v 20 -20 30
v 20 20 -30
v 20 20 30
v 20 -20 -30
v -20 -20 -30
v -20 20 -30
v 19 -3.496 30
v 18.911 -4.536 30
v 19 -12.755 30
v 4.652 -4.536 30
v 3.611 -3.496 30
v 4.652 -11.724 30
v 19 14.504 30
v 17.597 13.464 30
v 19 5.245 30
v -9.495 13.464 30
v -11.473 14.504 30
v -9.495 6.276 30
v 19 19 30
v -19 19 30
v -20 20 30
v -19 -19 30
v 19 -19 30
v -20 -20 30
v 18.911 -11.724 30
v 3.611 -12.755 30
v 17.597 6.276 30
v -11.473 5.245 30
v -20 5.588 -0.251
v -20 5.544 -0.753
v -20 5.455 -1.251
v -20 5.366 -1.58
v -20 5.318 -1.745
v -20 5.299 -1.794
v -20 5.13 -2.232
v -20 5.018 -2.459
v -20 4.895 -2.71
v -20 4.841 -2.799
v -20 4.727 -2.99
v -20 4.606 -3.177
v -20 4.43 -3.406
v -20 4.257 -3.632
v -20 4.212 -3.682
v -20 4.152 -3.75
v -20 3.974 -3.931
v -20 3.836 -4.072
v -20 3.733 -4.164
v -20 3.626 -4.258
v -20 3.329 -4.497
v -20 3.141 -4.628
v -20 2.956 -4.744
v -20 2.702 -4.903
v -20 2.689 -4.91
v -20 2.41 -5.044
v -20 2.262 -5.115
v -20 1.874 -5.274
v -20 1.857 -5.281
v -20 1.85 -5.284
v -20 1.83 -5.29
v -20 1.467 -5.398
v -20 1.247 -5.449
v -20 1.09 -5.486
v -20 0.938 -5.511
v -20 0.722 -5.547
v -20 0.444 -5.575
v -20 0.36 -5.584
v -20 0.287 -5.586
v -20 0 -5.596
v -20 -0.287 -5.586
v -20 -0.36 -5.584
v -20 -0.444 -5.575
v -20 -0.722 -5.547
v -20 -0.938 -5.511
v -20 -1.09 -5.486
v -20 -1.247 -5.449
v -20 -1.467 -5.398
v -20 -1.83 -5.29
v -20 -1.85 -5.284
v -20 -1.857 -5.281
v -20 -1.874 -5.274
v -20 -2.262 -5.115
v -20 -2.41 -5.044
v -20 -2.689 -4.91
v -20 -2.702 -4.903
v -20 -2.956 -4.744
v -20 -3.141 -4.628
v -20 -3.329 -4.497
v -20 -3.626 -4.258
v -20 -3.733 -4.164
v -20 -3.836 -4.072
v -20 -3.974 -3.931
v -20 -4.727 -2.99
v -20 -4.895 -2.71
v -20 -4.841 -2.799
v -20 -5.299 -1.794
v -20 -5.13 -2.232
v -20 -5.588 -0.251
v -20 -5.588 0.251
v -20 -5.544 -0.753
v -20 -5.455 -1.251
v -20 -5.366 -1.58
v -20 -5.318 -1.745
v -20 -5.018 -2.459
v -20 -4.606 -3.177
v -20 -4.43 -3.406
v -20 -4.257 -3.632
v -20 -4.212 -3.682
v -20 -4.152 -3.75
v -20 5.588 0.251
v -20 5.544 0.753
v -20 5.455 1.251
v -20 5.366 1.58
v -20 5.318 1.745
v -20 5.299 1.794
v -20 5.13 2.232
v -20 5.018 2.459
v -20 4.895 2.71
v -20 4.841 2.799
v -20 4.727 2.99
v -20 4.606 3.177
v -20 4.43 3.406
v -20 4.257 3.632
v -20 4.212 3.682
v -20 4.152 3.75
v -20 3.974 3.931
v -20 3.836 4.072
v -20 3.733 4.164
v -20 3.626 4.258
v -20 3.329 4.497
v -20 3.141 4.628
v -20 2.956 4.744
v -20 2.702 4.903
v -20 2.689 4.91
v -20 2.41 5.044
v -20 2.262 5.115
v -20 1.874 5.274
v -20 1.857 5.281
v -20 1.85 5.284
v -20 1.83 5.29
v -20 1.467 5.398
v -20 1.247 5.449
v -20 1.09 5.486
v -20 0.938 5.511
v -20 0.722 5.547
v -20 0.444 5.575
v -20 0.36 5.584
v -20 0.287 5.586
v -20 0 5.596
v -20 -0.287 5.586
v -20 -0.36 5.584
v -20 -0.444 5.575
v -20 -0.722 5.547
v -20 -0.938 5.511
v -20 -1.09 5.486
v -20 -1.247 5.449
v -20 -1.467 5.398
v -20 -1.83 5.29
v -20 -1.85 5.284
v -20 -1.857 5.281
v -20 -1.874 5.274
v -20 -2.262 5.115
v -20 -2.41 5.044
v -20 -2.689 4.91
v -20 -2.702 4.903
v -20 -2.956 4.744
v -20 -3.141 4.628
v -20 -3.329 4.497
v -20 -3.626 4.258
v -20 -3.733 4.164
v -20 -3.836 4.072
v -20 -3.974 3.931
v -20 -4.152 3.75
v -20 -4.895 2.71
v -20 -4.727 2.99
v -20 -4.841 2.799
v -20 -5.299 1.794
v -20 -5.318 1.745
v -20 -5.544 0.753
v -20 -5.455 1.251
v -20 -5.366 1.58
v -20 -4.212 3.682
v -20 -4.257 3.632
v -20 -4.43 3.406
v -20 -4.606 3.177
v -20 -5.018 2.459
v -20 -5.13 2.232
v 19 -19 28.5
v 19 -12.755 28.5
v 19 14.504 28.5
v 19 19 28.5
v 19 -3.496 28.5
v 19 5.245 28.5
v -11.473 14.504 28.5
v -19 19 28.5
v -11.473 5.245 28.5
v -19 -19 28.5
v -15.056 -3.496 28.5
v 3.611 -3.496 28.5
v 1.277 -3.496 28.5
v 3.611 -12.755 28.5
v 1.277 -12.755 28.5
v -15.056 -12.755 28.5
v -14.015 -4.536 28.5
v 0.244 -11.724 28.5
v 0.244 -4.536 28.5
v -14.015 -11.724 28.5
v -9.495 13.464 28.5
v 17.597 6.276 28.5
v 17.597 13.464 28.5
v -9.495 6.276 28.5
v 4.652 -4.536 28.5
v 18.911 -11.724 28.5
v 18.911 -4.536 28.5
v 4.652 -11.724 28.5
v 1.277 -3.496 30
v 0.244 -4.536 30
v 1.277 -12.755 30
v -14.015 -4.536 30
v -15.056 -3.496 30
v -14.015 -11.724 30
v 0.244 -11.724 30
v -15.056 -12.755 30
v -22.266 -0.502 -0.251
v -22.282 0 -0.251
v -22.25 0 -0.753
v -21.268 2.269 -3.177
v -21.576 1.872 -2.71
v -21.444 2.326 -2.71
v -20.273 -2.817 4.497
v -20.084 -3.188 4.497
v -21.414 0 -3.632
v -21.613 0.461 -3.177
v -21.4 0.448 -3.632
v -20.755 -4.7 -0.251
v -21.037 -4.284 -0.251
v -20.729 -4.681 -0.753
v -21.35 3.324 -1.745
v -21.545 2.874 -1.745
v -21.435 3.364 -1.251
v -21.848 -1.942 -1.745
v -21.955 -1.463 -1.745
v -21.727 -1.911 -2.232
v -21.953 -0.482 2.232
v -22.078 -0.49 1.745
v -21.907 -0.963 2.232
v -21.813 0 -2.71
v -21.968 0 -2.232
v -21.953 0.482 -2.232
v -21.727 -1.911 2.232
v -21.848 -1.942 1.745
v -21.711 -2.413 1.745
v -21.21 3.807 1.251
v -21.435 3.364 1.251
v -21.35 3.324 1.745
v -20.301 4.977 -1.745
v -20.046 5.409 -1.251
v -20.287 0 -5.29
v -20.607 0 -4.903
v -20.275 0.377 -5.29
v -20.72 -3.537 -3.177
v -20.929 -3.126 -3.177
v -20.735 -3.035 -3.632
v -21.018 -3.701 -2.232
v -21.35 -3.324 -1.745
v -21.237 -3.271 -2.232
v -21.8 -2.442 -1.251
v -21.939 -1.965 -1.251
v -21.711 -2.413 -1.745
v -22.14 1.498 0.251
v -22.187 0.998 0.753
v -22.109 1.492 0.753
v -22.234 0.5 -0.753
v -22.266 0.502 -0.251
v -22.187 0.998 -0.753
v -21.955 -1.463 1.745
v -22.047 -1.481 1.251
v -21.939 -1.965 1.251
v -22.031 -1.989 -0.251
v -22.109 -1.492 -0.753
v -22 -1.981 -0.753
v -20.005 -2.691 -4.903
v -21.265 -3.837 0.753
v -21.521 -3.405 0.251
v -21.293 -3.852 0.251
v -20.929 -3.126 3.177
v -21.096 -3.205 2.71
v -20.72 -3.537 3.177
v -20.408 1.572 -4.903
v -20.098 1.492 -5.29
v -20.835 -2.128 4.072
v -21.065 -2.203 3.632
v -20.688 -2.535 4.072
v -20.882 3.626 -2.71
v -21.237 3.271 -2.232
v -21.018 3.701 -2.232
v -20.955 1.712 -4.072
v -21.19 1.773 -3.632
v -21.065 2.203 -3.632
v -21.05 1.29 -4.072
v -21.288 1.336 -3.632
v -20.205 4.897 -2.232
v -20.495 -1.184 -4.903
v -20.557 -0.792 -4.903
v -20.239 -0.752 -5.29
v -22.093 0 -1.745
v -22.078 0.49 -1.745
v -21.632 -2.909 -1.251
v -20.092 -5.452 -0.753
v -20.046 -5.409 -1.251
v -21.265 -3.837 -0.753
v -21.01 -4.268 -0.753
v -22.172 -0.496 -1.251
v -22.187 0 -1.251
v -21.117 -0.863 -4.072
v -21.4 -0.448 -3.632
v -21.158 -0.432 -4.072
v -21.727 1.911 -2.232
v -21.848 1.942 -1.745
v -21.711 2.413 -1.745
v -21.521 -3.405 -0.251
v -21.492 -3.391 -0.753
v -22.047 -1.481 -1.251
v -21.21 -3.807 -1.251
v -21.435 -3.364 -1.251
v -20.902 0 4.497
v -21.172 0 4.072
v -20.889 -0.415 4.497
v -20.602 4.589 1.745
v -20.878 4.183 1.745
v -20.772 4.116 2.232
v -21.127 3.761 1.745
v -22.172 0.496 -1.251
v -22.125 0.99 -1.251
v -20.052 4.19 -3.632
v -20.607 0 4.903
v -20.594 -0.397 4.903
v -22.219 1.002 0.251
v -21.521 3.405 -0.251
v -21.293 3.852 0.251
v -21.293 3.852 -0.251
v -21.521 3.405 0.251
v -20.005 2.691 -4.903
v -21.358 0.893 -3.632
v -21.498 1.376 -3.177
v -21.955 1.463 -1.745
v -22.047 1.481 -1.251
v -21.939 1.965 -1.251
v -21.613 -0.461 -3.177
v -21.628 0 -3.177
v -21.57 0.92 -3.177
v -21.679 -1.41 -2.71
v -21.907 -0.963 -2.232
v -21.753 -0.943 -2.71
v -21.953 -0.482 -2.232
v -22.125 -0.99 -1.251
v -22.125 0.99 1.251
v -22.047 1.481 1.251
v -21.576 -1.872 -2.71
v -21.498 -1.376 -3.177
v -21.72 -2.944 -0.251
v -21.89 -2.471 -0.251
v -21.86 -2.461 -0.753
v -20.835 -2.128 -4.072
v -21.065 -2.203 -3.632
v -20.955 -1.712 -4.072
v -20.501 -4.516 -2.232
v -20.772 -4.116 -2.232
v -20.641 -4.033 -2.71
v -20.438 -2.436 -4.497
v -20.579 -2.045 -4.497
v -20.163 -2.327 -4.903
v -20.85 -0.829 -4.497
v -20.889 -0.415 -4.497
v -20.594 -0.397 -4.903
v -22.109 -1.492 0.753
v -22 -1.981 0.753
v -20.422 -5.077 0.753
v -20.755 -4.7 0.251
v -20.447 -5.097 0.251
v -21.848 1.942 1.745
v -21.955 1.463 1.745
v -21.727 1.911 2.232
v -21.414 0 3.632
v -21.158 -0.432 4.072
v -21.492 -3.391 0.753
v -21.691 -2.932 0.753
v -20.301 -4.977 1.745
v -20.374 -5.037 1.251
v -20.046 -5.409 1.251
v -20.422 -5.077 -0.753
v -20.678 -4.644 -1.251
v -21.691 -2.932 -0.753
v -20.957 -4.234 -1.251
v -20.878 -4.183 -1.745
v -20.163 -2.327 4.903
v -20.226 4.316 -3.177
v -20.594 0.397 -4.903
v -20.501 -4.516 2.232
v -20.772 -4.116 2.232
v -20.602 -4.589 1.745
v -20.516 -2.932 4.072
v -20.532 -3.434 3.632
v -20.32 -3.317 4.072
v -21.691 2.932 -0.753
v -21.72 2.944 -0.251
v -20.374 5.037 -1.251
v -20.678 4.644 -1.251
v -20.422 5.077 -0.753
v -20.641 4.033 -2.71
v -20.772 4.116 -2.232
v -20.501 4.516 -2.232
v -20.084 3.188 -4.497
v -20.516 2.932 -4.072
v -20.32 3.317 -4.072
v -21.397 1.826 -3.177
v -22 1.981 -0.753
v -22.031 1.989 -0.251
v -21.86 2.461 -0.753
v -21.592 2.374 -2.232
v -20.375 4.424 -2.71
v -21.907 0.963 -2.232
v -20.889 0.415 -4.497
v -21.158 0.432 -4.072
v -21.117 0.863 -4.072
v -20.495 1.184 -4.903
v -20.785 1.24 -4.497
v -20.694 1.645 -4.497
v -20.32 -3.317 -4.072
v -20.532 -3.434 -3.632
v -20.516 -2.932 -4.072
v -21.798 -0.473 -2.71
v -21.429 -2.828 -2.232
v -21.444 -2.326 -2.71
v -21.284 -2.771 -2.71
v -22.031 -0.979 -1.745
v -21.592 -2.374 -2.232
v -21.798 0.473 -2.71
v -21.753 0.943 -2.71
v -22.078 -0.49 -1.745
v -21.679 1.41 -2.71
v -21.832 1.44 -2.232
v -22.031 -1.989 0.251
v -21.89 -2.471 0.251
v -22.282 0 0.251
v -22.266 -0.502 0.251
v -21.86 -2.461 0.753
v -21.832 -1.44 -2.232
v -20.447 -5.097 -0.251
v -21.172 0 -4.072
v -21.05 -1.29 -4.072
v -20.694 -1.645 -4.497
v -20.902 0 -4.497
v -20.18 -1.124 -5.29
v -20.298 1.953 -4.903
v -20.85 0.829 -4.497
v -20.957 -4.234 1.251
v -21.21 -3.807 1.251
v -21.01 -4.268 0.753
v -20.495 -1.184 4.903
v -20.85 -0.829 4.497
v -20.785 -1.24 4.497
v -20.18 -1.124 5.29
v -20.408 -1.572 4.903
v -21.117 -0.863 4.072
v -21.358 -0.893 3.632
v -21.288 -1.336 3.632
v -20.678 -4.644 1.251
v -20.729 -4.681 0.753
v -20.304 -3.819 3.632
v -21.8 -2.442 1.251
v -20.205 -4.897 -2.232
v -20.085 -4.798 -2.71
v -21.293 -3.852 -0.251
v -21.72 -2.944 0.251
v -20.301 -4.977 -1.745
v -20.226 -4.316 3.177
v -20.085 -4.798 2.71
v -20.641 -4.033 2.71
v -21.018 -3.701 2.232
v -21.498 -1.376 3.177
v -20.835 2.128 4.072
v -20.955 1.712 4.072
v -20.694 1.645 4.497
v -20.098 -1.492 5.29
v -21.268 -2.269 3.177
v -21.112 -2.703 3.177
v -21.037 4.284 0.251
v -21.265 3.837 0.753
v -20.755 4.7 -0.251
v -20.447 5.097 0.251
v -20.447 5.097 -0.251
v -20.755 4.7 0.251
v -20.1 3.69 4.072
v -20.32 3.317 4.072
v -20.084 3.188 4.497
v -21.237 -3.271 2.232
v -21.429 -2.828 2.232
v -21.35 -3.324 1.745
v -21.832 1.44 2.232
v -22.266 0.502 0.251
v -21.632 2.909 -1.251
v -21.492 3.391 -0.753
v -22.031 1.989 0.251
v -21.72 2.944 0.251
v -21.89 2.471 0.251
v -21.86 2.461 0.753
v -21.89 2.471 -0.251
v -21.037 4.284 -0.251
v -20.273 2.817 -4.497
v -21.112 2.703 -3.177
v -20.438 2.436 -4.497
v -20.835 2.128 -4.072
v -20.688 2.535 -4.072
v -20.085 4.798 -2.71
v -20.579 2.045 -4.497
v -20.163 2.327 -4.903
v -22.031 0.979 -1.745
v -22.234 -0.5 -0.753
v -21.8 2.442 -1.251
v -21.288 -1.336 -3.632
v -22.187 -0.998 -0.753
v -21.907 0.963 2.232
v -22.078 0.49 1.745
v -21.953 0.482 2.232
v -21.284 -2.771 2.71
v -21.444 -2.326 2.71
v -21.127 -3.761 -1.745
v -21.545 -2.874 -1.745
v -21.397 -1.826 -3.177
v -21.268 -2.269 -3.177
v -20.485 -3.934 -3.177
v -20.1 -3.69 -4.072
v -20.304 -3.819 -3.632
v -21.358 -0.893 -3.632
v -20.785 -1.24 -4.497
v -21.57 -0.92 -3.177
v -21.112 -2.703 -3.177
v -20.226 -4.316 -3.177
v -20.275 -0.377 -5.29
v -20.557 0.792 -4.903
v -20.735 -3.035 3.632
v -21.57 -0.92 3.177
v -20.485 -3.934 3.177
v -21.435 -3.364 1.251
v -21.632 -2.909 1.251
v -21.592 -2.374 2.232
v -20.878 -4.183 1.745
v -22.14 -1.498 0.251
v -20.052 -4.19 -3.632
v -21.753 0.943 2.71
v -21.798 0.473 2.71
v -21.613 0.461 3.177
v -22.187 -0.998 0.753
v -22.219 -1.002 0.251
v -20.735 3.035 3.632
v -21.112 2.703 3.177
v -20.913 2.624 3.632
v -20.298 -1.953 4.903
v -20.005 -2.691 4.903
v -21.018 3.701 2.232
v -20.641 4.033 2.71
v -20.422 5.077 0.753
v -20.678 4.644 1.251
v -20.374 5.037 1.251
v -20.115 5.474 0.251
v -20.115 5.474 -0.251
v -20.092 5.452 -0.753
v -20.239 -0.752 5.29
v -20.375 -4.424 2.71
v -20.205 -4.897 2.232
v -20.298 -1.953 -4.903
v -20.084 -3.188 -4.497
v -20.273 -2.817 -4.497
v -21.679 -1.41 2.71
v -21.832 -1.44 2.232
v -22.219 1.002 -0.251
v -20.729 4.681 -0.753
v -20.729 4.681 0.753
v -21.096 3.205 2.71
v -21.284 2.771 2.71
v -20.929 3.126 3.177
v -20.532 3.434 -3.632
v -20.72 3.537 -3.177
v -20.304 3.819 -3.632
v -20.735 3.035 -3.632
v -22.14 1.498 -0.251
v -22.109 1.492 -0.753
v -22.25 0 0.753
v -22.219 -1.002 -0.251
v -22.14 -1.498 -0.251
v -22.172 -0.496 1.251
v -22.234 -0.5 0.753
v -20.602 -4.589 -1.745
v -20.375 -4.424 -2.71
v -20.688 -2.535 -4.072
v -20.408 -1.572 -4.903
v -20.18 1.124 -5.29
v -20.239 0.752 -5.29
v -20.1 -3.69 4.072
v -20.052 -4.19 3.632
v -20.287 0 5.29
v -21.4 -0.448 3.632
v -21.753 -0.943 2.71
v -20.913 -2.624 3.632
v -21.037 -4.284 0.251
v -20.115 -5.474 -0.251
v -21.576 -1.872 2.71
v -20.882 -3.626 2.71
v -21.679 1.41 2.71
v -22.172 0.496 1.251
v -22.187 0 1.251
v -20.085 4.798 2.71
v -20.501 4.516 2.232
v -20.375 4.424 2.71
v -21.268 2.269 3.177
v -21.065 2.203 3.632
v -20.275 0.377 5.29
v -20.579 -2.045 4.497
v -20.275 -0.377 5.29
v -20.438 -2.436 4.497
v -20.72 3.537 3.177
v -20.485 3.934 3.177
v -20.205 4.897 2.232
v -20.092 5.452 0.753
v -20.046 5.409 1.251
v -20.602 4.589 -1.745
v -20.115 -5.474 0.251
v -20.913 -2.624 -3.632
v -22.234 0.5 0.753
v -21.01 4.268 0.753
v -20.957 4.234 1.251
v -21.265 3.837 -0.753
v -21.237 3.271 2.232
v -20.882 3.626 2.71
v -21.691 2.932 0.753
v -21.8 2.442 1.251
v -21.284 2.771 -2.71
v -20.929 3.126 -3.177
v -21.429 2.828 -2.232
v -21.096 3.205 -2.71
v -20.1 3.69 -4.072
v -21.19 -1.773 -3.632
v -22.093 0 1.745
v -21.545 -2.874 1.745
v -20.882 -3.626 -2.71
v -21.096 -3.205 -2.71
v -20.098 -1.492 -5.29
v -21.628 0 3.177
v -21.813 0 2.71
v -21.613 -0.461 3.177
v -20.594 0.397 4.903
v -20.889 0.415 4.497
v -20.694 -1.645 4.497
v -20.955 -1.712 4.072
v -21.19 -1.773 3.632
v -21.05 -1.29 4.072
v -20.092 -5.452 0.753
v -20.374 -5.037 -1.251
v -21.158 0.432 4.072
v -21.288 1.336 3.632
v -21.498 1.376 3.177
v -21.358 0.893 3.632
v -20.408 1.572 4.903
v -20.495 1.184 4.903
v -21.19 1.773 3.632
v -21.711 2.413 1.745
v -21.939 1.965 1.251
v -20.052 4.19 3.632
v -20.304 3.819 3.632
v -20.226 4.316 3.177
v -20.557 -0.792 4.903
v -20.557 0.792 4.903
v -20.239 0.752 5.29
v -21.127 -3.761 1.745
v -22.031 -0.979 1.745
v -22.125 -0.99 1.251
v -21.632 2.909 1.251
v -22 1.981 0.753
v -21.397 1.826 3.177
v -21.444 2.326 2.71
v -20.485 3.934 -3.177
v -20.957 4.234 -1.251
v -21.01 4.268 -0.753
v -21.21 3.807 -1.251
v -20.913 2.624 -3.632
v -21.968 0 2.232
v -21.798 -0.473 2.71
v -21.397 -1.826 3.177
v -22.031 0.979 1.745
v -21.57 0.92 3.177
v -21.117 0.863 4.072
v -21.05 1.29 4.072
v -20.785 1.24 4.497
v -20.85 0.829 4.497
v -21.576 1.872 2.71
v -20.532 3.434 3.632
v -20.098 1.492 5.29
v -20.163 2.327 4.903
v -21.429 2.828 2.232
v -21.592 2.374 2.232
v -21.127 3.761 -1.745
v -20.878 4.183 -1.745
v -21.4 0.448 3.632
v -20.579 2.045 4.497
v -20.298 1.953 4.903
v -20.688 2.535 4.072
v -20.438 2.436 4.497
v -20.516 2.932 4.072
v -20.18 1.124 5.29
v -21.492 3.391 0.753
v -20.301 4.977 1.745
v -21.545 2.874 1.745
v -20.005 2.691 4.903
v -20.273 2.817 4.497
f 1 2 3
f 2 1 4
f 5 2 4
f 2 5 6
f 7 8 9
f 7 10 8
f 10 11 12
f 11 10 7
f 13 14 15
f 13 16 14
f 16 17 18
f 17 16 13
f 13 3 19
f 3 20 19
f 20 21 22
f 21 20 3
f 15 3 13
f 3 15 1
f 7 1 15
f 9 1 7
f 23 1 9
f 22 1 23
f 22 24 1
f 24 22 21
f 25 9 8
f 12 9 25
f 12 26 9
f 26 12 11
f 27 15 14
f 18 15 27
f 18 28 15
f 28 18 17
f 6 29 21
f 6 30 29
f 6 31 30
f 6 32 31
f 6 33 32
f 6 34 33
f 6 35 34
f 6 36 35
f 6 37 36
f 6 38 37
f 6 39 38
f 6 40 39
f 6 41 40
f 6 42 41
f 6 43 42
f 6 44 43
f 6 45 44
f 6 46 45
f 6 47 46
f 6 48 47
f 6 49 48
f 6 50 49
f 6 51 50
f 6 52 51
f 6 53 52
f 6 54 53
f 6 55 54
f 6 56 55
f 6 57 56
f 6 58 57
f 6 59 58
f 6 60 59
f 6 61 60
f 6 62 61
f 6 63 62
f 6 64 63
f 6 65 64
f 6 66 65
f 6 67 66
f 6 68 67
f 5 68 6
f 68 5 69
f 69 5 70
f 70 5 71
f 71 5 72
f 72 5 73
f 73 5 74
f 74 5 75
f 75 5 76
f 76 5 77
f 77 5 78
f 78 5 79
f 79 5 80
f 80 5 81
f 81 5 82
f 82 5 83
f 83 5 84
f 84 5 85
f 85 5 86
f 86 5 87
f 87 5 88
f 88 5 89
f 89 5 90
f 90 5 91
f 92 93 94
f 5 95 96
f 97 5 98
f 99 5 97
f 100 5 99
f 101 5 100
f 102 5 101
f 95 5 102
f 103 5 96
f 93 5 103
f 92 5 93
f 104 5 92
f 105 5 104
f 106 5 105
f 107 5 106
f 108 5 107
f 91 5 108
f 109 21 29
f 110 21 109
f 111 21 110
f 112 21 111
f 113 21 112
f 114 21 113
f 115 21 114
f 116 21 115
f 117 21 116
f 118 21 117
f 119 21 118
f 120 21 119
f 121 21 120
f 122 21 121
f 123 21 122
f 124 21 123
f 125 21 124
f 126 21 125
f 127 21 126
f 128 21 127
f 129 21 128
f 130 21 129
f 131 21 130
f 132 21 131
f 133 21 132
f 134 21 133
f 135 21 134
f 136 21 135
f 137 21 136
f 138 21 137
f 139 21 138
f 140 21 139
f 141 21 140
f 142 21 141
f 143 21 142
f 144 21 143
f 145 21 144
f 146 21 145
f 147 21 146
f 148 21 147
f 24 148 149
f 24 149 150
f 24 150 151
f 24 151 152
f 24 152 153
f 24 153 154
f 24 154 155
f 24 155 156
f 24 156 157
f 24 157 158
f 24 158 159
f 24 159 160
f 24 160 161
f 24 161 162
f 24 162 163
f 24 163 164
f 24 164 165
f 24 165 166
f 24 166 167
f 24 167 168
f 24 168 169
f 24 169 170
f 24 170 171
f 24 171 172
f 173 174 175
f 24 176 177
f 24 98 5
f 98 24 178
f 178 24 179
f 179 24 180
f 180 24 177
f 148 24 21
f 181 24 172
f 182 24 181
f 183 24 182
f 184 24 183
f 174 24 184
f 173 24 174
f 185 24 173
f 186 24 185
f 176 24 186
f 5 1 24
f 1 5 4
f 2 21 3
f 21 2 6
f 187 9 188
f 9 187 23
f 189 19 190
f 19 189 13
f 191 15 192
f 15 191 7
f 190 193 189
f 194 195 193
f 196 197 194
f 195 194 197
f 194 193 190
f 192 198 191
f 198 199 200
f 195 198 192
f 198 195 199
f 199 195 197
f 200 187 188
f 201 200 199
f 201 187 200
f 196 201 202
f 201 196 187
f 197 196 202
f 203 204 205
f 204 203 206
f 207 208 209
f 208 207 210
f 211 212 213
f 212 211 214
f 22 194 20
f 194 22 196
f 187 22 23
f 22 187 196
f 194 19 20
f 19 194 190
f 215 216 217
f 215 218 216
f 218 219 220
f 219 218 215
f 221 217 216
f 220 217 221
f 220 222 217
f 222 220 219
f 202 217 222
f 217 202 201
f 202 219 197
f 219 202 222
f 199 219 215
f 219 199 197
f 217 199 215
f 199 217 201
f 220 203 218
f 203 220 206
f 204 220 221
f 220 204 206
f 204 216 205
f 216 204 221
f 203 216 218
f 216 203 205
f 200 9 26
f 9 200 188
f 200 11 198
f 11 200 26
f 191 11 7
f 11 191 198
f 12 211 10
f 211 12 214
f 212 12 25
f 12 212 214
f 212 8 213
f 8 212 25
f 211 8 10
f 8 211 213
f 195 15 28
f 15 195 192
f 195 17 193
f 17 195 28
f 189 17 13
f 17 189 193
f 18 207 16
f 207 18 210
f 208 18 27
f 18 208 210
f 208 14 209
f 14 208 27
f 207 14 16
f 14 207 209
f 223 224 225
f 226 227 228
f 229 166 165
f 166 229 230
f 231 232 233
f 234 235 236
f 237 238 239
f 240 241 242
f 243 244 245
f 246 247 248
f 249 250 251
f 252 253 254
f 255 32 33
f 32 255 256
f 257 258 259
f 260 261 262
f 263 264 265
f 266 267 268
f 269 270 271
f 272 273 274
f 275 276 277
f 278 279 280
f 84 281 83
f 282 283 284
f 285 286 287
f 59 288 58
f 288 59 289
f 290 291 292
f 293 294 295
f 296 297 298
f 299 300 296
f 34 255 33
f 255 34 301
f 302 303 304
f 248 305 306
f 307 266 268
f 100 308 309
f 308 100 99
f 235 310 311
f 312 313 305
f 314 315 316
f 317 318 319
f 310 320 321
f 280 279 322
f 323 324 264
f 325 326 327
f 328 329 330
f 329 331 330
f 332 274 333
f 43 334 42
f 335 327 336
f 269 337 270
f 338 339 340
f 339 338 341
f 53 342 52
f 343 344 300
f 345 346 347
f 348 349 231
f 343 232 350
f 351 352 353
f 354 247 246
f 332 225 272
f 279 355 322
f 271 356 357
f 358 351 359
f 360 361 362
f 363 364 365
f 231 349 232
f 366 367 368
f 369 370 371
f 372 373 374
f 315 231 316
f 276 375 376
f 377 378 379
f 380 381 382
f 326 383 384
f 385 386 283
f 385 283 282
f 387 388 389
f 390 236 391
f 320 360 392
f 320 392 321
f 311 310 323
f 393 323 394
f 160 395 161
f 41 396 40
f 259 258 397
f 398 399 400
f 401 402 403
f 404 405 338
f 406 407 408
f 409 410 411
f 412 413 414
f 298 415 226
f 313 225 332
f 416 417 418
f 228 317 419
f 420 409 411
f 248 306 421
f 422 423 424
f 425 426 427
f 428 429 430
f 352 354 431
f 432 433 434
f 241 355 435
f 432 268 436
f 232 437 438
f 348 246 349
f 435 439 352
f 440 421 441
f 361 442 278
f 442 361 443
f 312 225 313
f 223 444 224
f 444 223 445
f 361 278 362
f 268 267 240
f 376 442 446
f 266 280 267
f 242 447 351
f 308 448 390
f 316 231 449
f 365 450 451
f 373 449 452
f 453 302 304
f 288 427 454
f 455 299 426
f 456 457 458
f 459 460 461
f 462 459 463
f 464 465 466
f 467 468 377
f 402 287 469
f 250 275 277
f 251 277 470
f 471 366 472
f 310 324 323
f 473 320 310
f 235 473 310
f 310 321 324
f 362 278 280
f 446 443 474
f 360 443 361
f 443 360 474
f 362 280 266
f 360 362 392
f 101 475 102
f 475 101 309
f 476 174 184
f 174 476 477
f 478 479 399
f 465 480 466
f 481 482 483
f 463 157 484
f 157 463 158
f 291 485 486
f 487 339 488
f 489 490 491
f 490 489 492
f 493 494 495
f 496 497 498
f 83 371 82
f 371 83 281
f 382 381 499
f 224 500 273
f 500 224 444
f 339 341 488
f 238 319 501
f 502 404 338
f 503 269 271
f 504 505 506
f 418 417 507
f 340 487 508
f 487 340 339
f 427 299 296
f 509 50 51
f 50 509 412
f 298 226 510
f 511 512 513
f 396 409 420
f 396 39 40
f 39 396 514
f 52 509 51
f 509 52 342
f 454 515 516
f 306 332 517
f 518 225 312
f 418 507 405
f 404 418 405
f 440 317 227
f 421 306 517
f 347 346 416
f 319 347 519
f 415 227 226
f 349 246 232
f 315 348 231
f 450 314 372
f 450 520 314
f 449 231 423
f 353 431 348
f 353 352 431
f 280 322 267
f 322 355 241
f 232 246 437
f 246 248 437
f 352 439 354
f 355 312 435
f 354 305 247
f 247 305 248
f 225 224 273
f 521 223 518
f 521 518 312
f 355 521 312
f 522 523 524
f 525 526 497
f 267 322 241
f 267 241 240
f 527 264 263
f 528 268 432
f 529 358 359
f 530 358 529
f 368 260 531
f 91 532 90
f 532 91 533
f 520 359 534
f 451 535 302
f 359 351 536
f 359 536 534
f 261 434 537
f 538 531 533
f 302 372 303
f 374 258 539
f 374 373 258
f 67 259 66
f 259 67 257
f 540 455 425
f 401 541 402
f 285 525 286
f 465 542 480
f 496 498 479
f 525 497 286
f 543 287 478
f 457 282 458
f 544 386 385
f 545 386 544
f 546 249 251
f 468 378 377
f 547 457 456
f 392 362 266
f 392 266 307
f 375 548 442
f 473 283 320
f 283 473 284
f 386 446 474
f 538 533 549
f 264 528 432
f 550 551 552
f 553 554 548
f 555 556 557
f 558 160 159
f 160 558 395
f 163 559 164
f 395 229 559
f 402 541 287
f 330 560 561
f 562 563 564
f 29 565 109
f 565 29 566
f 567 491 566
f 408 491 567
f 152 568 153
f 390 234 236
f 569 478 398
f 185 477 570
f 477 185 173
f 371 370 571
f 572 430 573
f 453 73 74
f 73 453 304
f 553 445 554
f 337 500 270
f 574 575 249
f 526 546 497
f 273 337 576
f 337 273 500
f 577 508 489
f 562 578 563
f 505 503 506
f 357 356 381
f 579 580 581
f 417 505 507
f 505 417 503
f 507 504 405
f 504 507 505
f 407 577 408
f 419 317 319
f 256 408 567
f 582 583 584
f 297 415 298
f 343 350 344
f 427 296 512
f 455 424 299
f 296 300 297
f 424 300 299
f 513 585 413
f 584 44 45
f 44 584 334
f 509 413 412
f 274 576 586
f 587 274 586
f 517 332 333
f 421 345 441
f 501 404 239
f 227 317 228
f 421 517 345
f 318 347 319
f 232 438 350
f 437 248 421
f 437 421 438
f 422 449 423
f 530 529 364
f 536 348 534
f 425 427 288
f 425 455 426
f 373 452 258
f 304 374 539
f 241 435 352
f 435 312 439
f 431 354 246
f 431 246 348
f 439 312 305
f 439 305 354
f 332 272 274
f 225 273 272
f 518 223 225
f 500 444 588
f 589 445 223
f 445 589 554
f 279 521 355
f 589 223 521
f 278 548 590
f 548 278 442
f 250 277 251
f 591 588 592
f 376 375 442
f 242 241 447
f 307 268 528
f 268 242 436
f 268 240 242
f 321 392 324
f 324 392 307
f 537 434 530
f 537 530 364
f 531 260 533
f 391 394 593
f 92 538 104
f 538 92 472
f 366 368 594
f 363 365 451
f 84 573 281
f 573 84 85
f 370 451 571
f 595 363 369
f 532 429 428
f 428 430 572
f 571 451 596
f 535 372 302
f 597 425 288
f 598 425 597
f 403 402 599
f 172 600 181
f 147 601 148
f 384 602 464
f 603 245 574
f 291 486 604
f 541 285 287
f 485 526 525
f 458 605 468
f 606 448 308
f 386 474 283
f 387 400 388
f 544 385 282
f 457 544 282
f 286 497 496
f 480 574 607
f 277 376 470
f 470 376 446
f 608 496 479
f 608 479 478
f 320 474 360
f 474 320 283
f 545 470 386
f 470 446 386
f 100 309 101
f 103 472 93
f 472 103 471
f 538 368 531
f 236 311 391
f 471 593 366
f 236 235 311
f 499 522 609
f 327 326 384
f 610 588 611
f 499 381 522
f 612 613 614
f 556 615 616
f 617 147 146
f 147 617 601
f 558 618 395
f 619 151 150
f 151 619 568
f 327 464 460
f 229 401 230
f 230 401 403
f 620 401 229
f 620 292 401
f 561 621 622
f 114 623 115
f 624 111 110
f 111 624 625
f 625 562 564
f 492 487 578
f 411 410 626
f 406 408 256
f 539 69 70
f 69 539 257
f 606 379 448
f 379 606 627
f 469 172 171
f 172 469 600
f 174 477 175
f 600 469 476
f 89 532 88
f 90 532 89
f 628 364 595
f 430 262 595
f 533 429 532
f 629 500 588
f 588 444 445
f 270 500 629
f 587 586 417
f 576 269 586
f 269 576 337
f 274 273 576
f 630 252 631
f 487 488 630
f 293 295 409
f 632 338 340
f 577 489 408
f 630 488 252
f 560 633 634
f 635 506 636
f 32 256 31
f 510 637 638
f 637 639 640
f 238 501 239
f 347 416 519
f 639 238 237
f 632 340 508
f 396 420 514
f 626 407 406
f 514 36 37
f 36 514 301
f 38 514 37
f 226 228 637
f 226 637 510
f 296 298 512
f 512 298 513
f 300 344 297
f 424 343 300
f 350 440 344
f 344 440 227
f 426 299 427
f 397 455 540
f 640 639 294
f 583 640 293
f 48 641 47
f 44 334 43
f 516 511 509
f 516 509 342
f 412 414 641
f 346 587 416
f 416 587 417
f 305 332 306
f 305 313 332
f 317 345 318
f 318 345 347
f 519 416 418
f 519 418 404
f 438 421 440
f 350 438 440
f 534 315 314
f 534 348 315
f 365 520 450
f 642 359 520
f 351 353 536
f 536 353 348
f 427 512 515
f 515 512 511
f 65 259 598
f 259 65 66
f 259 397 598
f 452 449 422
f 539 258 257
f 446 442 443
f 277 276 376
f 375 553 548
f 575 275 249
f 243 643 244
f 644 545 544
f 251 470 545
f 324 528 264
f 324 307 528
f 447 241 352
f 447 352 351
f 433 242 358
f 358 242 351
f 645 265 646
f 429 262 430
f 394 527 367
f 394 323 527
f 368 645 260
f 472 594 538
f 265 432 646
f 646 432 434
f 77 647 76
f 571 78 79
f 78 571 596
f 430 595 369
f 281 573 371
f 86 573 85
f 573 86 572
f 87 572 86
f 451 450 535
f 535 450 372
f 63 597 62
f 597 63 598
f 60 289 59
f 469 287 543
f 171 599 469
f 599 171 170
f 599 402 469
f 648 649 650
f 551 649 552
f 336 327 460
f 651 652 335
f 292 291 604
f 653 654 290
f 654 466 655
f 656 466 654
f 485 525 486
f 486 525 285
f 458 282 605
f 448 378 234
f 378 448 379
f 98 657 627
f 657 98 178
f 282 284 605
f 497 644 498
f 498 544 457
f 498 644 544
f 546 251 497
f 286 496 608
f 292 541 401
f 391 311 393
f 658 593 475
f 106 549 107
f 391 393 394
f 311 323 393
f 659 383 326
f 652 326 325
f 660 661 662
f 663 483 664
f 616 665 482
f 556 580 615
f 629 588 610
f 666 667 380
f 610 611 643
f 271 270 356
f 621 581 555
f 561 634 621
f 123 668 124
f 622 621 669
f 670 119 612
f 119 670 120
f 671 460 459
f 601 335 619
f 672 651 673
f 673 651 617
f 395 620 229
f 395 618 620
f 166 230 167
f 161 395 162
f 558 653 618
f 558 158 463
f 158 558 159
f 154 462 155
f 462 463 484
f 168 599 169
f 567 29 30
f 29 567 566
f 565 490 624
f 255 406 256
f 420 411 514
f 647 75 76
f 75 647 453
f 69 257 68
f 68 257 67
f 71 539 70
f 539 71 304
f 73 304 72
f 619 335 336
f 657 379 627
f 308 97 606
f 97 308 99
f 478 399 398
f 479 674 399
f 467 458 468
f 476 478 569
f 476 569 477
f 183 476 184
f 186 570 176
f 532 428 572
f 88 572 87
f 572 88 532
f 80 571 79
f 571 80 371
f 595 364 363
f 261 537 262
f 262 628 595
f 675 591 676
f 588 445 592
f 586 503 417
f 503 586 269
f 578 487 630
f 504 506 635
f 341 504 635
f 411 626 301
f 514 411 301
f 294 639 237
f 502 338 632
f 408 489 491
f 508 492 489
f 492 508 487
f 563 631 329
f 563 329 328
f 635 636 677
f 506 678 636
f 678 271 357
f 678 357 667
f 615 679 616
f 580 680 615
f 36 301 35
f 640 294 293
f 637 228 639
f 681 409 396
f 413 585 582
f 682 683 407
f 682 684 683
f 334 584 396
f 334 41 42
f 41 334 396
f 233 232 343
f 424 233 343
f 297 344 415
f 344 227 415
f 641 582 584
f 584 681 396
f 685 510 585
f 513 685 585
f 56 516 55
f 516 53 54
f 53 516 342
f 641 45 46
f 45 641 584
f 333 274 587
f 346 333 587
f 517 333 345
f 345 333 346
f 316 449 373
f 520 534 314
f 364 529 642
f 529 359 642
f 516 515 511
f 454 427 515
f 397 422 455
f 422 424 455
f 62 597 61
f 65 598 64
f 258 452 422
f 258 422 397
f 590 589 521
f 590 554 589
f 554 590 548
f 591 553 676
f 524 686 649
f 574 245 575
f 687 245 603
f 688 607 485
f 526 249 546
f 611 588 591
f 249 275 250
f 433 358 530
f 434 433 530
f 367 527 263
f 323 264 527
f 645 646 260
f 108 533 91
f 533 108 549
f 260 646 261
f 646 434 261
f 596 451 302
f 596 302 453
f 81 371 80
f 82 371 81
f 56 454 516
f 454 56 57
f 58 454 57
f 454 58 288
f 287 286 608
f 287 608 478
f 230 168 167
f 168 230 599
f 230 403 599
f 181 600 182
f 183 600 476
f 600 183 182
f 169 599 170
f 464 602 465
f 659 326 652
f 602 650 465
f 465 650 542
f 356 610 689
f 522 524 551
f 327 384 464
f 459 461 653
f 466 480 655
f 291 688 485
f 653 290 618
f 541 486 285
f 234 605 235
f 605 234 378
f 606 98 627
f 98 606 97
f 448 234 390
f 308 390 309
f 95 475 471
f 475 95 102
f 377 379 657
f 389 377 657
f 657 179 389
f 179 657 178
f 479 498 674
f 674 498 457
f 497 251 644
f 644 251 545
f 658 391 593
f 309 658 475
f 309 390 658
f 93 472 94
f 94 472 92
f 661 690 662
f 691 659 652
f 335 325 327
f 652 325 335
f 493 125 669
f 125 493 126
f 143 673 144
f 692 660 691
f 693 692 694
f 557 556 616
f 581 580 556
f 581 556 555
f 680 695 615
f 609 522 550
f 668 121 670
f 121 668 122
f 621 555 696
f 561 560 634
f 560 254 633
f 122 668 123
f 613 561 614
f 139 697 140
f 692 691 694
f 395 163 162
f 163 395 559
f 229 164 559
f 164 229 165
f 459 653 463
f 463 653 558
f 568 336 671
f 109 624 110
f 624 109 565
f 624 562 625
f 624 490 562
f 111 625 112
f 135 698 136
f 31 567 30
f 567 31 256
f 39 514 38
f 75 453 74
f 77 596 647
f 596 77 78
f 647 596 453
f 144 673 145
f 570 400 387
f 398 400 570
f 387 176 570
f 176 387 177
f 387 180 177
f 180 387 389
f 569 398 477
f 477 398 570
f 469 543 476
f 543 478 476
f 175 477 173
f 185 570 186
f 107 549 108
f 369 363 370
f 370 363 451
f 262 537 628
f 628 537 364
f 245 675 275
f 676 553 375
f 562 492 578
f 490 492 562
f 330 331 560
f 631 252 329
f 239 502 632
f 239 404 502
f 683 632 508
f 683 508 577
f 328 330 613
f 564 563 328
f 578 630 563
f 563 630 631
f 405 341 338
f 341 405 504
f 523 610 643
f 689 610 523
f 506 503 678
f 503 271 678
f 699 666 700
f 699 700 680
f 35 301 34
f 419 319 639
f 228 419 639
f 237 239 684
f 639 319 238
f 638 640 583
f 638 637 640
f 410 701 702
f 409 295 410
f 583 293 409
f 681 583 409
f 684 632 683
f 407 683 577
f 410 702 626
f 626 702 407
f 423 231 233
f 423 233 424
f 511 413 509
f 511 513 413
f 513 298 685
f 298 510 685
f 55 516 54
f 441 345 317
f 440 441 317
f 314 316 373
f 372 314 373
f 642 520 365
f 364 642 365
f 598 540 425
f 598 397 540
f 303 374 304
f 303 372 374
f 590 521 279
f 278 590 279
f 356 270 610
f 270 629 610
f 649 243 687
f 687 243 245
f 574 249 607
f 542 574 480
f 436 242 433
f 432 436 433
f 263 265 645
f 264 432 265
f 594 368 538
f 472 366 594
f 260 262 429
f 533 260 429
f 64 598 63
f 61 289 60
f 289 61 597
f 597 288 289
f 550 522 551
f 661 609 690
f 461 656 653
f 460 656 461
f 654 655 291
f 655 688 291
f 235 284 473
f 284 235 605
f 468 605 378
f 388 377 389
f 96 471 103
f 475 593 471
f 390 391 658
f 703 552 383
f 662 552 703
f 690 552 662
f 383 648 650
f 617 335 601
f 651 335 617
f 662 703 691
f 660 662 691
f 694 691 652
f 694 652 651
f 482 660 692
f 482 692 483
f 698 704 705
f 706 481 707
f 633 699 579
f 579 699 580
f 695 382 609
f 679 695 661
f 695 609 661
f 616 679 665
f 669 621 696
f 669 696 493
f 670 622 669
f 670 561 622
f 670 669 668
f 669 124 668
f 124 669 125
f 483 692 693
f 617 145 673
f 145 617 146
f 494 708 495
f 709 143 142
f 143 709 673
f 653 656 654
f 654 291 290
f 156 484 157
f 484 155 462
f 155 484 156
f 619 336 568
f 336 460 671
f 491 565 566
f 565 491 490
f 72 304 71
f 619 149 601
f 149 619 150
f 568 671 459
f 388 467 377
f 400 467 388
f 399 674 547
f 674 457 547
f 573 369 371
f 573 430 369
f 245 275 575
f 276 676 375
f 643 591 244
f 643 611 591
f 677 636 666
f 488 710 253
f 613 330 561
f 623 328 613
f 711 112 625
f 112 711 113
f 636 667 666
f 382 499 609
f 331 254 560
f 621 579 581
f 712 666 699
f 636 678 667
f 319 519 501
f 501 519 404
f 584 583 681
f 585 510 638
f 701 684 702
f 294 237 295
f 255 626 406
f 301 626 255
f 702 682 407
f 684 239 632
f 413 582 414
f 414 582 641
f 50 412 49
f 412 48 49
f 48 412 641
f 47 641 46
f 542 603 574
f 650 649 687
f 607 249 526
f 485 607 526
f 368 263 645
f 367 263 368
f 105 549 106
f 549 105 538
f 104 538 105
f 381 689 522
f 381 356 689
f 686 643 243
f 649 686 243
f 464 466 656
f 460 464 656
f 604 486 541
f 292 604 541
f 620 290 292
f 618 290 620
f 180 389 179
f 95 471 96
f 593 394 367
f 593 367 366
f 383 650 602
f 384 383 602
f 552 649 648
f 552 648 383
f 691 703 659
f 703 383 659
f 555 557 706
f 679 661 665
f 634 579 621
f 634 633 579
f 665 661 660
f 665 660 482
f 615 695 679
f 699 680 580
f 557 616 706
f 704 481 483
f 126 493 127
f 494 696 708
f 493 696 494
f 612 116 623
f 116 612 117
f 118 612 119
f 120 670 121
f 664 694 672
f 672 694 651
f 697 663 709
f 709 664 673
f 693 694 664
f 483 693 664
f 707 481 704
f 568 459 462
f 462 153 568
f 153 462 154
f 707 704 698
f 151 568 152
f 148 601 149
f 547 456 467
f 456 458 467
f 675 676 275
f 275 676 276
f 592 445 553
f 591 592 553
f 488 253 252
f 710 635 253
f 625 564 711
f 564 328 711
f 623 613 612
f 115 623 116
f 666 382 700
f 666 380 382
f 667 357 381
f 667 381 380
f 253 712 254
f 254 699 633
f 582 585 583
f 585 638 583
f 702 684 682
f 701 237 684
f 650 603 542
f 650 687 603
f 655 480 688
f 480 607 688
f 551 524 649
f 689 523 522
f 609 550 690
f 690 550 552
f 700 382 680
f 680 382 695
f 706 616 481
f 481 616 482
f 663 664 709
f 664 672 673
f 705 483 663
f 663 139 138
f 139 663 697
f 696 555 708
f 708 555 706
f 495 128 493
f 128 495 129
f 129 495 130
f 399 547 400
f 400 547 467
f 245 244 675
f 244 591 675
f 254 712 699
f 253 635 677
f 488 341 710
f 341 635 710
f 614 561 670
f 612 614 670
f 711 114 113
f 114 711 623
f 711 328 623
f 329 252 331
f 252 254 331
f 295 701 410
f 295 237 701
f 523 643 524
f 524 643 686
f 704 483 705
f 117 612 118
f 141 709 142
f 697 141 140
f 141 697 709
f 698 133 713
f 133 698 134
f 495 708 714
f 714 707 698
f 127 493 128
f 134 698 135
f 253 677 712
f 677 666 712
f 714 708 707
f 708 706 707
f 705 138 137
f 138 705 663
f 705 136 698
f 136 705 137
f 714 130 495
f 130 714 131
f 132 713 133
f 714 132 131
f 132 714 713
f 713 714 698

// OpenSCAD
// (1 Char)
last_name = "傅";
//Firstname (1st Char)
first_name_1 = "歐";
//Firstname (2nd Char)
first_name_2 = "立";
//Stamp Size (mm)
size = 40; // [15:5:100]
// Google Fonts
font = "PingFang TC:style=Semibold";

//font = "Weibei TC:style=Bold";

height = size*1.5;
$fn = 100 * 1;

rotate([180,0,0])
union(){
difference(){
    cube([size,size,height], center = true);
    translate([0,0,-height/2])
        cube([size-2,size-2,3], center = true);
}
translate([0,0,-height/2 - 0])
    linear_extrude(height=5, scale=1)
    union(){
        translate([-size/20,size/5]) rotate([0,0,90])
            text(first_name_1, font = font, size=size/3, halign="center", spacing = 1);
        translate([size/2.4,size/5]) rotate([0,0,90])
            text(first_name_2, font = font, size=size/3, halign="center", spacing = 1);
        
        
        translate([size/3,-size/4])
            rotate([0,0,90])        
                scale([1,1.9])
                    text(last_name, font = font, size=size/3, halign="center", spacing = 1);
    }

translate([-size/2.8,0,0]) sphere(r=size/5);
}
